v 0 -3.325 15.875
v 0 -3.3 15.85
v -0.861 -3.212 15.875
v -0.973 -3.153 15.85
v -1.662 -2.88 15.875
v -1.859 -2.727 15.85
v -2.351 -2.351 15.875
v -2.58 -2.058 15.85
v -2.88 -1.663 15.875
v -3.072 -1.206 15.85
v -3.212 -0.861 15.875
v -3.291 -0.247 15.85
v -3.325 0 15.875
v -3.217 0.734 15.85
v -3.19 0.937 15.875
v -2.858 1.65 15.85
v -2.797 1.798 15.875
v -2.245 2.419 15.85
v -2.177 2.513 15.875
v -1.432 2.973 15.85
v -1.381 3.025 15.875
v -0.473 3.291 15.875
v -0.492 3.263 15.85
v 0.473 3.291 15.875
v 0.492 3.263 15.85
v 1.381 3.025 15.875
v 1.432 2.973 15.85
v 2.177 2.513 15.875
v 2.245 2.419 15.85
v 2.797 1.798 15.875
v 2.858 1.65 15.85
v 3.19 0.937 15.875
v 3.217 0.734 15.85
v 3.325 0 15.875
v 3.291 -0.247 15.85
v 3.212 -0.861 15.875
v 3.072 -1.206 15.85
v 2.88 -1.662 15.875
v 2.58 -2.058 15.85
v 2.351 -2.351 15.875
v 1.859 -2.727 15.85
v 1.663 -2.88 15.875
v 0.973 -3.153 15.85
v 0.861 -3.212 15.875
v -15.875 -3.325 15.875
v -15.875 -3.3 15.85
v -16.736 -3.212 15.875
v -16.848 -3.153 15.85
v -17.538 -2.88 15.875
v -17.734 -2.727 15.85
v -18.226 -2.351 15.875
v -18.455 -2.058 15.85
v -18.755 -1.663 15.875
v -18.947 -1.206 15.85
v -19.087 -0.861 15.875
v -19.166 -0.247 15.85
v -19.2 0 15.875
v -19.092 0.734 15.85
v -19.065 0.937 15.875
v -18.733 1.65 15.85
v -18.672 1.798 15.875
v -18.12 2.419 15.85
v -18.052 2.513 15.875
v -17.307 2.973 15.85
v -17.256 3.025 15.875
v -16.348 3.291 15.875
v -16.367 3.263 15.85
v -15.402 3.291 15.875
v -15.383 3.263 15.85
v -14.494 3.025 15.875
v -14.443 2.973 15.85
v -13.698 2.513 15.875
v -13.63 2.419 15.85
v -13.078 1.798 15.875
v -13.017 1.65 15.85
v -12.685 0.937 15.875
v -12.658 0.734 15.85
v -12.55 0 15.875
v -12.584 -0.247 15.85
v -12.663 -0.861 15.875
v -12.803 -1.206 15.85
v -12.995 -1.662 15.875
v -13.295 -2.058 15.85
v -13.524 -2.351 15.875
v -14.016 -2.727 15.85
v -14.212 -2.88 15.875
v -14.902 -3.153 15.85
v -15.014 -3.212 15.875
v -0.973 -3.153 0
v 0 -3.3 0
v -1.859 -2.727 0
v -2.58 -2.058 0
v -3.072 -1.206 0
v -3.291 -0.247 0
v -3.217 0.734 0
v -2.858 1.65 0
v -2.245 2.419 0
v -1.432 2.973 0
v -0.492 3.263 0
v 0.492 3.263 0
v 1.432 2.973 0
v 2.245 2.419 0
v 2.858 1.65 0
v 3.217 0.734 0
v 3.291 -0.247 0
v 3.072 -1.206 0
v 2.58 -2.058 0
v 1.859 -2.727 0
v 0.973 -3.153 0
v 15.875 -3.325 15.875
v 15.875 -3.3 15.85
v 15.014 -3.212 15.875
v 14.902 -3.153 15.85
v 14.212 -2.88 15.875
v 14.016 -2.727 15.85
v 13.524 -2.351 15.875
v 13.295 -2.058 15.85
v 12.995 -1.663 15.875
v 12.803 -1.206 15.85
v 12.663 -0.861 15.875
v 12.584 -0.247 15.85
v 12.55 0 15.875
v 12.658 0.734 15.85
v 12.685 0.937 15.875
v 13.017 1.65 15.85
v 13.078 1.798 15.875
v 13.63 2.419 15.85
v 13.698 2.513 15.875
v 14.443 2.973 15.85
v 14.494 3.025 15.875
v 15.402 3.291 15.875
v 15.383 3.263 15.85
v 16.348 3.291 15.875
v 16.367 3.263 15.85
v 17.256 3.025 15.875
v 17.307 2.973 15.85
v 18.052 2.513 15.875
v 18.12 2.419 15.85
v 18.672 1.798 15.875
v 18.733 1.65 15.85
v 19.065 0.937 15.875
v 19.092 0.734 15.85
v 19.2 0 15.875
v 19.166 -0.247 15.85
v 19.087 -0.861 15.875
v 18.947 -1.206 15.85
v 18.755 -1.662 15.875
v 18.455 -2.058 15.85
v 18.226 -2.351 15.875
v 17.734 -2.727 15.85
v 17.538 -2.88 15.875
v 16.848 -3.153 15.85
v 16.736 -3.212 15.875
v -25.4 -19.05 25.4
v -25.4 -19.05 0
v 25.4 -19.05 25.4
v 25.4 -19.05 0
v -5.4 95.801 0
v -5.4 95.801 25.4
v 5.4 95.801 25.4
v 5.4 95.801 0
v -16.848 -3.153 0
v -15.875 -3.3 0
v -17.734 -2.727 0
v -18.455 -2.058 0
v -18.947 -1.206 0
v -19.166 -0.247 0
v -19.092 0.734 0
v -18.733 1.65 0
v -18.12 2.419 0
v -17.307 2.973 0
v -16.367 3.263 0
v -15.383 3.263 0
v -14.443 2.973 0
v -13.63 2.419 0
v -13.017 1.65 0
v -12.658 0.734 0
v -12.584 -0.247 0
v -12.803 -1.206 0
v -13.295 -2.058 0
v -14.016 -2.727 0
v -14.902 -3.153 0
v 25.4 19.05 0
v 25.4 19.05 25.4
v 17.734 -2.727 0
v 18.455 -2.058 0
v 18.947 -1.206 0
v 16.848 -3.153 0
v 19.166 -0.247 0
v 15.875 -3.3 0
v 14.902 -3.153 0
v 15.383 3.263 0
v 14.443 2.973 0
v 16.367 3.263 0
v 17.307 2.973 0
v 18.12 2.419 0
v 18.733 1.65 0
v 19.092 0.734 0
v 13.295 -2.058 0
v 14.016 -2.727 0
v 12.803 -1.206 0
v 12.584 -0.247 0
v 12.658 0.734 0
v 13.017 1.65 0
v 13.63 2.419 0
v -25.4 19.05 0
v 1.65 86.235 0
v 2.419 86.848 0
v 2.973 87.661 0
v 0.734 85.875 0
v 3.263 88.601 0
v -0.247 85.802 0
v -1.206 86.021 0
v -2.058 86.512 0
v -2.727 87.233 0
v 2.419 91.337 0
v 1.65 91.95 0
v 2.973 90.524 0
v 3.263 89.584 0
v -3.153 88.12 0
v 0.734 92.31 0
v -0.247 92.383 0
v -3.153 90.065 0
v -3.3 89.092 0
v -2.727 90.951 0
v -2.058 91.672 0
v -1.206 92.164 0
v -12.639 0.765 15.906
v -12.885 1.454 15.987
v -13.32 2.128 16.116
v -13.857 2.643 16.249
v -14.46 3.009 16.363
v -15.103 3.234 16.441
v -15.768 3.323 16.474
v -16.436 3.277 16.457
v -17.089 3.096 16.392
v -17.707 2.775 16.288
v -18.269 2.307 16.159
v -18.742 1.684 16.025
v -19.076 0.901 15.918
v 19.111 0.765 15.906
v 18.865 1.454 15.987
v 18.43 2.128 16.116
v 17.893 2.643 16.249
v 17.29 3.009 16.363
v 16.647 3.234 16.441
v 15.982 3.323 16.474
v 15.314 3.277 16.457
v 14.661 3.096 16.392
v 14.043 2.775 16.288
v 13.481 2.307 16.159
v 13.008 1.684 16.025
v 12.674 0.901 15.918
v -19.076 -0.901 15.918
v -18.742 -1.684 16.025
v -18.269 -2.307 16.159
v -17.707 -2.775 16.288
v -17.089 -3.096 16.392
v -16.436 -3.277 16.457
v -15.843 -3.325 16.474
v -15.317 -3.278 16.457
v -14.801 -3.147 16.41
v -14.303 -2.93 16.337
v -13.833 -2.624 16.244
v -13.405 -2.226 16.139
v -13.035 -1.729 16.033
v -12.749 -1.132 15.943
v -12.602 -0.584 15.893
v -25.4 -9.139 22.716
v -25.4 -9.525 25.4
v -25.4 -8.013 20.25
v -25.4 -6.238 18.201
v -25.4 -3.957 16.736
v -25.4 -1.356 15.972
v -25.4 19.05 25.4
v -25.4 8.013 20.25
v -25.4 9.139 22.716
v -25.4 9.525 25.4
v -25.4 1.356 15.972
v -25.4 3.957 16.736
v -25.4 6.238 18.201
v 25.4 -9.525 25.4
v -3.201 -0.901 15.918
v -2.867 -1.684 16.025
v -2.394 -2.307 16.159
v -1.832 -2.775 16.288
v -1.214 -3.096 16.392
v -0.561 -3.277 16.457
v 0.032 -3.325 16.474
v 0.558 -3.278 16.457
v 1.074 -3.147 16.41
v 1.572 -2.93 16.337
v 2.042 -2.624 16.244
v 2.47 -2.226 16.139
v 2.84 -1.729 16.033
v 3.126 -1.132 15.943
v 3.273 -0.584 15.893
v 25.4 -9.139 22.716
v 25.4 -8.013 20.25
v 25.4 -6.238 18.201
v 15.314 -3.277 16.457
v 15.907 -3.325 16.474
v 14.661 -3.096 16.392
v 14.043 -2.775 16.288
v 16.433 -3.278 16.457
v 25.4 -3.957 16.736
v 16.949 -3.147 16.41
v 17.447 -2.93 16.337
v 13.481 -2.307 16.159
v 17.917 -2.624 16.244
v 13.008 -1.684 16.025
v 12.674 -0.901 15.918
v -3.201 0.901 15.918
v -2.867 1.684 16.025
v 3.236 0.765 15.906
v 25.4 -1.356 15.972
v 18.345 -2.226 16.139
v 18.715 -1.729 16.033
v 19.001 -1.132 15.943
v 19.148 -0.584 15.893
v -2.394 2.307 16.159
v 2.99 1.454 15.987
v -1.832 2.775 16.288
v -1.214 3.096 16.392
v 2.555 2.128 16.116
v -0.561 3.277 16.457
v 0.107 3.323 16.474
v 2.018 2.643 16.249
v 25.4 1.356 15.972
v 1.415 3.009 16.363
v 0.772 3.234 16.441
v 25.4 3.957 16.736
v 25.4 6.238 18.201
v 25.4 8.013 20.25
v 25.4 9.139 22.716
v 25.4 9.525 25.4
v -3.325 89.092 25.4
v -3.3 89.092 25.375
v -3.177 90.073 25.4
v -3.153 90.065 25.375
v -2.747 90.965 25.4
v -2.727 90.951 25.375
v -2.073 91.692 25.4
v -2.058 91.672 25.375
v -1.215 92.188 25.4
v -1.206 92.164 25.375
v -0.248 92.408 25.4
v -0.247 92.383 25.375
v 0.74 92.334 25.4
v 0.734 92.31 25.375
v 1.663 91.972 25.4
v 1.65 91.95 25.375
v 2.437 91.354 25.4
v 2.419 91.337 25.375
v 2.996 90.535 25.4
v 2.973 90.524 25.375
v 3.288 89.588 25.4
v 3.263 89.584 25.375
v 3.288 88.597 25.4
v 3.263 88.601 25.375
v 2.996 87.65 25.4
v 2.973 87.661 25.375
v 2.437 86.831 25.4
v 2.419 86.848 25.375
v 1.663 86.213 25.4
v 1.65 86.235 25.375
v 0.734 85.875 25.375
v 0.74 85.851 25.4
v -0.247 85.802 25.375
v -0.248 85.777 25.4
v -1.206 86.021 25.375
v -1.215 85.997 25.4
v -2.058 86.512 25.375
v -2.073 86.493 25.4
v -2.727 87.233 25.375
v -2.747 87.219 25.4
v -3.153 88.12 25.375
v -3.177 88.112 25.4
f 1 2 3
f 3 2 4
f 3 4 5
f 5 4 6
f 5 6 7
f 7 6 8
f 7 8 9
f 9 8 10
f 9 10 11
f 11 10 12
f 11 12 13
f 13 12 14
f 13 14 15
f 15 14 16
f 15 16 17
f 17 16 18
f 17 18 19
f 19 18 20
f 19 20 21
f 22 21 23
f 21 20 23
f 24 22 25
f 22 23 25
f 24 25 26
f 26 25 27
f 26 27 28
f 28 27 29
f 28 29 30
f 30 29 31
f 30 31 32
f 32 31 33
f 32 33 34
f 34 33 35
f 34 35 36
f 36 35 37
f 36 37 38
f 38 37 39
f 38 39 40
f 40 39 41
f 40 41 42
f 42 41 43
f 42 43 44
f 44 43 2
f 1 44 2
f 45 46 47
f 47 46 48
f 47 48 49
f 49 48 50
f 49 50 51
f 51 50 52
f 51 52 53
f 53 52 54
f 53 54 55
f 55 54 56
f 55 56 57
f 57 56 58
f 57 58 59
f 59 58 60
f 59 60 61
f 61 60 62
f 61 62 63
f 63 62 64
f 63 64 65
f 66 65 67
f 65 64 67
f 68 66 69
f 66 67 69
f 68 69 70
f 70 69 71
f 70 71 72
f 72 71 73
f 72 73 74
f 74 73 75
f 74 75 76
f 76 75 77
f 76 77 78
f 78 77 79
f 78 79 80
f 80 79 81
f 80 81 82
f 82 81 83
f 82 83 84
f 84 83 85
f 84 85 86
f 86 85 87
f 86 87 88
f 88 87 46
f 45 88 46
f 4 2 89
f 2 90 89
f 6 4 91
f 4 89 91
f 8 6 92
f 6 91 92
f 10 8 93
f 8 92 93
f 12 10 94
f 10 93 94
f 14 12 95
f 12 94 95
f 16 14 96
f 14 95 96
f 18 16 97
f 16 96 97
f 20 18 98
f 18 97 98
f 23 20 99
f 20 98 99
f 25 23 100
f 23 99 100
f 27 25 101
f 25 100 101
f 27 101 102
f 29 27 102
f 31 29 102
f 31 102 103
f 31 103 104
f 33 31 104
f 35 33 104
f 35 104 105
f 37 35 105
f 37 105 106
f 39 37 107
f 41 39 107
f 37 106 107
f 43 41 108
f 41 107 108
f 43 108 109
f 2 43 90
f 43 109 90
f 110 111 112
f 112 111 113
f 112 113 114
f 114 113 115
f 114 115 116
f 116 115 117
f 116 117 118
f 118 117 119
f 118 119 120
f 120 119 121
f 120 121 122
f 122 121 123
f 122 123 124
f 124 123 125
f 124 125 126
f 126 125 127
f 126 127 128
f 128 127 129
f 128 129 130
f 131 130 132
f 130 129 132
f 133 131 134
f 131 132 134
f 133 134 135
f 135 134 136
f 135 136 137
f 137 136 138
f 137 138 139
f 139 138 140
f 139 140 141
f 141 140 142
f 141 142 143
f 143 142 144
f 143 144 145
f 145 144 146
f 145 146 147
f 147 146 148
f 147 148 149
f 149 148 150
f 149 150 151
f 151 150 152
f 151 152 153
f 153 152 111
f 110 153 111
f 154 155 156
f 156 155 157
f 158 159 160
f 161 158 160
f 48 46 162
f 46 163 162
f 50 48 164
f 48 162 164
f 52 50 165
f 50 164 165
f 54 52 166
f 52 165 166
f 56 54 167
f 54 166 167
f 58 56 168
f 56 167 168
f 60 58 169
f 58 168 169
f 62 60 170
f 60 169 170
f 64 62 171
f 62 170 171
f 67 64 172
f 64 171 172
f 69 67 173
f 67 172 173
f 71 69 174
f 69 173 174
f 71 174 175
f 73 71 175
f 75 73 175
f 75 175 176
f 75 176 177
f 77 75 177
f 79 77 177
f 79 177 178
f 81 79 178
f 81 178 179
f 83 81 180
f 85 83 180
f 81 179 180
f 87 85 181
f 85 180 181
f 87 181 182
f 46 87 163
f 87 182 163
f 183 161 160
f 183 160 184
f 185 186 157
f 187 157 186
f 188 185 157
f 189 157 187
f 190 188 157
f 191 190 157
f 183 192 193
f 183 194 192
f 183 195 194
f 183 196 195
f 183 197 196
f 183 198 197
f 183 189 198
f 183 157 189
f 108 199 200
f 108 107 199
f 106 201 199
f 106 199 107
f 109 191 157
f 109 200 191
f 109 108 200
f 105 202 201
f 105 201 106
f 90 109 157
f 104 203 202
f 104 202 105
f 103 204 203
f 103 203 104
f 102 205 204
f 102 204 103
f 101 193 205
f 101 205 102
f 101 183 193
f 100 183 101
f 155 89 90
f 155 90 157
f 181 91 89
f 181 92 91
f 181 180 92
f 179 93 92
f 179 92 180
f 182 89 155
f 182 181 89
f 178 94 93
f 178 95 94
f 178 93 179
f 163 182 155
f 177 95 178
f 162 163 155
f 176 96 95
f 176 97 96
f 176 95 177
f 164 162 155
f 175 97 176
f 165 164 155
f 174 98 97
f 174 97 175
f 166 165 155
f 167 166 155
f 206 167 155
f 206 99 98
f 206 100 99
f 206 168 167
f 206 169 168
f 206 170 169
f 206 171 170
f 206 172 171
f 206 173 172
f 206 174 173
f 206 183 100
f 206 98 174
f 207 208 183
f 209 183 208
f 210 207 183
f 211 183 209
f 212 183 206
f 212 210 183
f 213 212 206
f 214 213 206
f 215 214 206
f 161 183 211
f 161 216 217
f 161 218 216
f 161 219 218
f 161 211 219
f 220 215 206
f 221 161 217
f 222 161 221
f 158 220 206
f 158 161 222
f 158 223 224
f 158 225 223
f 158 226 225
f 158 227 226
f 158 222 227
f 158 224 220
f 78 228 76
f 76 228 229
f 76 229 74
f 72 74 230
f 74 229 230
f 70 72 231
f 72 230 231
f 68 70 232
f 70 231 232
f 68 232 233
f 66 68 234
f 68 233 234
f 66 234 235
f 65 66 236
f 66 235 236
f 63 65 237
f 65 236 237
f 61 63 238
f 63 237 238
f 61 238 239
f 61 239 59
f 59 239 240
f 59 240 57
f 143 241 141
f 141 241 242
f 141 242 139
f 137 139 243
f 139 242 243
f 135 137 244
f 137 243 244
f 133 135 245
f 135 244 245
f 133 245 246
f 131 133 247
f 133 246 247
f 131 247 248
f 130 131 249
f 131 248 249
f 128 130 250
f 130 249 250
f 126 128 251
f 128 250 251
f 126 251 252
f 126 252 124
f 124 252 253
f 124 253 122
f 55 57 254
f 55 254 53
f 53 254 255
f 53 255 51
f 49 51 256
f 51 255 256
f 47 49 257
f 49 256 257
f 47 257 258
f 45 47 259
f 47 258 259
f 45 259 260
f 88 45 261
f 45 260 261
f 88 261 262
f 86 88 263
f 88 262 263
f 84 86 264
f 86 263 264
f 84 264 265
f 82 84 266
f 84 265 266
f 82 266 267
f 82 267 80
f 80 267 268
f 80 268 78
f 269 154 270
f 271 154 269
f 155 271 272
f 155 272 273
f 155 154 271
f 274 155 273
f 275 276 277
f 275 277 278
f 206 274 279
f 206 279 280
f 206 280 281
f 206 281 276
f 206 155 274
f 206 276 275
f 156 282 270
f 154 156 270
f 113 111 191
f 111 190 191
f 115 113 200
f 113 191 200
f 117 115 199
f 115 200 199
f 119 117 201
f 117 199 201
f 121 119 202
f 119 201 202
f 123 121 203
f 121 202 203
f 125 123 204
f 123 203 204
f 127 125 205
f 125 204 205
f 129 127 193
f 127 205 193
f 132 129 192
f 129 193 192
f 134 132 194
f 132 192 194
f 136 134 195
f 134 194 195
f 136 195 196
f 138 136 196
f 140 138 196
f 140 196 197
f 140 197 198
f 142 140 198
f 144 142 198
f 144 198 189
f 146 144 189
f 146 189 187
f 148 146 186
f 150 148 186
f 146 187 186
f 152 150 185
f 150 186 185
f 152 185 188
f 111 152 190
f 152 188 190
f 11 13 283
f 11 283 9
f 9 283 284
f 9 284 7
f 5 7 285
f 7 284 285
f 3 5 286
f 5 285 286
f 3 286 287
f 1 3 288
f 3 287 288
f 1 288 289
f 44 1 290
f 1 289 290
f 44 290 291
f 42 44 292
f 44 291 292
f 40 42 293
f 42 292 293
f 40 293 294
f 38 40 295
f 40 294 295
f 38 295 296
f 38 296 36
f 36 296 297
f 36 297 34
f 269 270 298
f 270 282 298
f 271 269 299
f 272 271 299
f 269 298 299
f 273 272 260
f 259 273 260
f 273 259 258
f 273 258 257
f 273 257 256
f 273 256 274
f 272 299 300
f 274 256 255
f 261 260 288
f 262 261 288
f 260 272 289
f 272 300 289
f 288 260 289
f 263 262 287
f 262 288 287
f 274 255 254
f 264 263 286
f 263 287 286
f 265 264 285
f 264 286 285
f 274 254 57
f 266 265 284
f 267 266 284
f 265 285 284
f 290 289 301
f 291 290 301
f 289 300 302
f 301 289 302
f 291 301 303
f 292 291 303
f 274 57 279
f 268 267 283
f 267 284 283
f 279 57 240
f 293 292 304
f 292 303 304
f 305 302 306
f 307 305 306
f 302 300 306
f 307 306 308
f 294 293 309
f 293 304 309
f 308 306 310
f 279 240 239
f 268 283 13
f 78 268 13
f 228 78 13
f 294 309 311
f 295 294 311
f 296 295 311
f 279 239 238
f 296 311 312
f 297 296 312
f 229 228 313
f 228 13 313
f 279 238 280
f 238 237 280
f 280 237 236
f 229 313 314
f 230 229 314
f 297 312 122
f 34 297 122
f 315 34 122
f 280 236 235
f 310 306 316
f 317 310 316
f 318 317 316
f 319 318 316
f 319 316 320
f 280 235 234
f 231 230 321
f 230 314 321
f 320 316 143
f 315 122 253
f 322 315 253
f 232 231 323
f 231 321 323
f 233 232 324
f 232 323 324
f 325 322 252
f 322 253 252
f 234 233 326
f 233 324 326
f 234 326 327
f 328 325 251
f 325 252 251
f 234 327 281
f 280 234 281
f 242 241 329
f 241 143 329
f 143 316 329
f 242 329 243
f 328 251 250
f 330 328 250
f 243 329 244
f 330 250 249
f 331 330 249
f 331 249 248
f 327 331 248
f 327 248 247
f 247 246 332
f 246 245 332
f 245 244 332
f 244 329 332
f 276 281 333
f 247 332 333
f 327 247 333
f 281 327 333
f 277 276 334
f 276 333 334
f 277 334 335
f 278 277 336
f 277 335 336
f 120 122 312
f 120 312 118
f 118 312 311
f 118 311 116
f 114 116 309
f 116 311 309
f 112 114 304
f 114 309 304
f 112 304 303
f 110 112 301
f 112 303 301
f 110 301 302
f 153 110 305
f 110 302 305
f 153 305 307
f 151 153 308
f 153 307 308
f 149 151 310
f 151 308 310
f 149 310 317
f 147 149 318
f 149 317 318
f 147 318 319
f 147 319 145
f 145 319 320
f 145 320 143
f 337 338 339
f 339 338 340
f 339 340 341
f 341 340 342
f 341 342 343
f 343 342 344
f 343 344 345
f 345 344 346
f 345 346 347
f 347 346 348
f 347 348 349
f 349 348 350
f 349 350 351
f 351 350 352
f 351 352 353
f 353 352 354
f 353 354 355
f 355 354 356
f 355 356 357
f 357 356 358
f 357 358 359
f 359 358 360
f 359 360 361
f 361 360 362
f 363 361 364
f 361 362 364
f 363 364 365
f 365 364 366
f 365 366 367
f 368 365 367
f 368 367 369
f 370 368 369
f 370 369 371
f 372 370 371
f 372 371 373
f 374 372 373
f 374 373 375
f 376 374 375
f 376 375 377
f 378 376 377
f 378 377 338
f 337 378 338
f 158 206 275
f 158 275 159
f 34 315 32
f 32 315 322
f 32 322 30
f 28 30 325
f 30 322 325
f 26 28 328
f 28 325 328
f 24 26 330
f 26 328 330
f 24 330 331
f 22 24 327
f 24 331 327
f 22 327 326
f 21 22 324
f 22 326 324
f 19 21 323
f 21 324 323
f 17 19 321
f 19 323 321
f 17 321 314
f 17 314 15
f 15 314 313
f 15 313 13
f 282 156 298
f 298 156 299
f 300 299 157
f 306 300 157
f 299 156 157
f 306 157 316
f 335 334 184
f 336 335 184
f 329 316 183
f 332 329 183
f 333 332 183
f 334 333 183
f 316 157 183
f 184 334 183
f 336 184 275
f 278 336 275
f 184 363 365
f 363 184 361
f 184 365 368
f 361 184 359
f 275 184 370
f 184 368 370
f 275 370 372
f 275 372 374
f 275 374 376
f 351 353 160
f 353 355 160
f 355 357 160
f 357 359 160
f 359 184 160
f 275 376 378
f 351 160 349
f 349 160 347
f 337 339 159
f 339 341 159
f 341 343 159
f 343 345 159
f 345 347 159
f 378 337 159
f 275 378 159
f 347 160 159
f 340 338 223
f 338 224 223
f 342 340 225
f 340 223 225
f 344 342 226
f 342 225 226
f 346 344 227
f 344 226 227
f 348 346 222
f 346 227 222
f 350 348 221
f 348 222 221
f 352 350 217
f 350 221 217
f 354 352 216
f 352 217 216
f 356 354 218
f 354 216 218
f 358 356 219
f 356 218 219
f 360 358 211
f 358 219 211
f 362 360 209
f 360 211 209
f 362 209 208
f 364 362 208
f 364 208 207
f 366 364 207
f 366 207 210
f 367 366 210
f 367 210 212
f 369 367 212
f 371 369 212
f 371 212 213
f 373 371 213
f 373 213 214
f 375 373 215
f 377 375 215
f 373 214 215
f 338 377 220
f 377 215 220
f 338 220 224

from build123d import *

# Parameters (mm, degrees)
SKETCH1_W                                = 50.8
SKETCH1_H                                = 38.1
BOSS_EXTRUDE1_DEPTH                      = 25.4
CUT_SWEEP1_PROFILE_R                     = 9.525
M6_CLEARANCE_HOLE1_D                     = 6.6
M6_CLEARANCE_HOLE1_CSINK_D               = 6.65
M6_CLEARANCE_HOLE1_CSINK_ANGLE           = 90
M6_CLEARANCE_HOLE1_ON_FACE_2_D           = 6.6
M6_CLEARANCE_HOLE1_ON_FACE_2_CSINK_D     = 6.65
M6_CLEARANCE_HOLE1_ON_FACE_2_CSINK_ANGLE = 90


with BuildPart() as part:
    # Sketch1 → Boss-Extrude1 (new body)
    with BuildSketch(Plane.XY):
        Polygon((5.399653784, 95.801105715), (25.4, 19.05), (-25.4, 19.05), (-5.399653784, 95.801105715), align=None)
        Rectangle(SKETCH1_W, SKETCH1_H)
    extrude(amount=BOSS_EXTRUDE1_DEPTH)

    # Cut-Sweep1: sweep along a path in Sketch2
    with BuildLine(Plane.XY.offset(25.4)) as cut_sweep1_path:
        Line((-25.4, 0), (25.4, 0))
    # Cut-Sweep1 profile (on start of the path) → Cut-Sweep1 (sweep, cut)
    with BuildSketch(Plane(origin=(-25.4, 0, 25.4), x_dir=(0, 1, 0), z_dir=(1, 0, 0))):
        Circle(CUT_SWEEP1_PROFILE_R)
    sweep(path=cut_sweep1_path.line, mode=Mode.SUBTRACT)

    # M6 Clearance Hole1 (through all)
    with Locations(Plane(origin=(0, 0, 15.875), x_dir=(0, 1, 0), z_dir=(0, 0, 1))):
        with Locations((0, 0), (0, 15.875), (0, -15.875)):
            CounterSinkHole(M6_CLEARANCE_HOLE1_D / 2, M6_CLEARANCE_HOLE1_CSINK_D / 2, counter_sink_angle=M6_CLEARANCE_HOLE1_CSINK_ANGLE)

    # M6 Clearance Hole1 on face 2 (through all)
    with Locations(Plane(origin=(0, 89.092444953, 25.4), x_dir=(1, 0, 0), z_dir=(0, 0, 1))):
        with Locations((0, 0)):
            CounterSinkHole(M6_CLEARANCE_HOLE1_ON_FACE_2_D / 2, M6_CLEARANCE_HOLE1_ON_FACE_2_CSINK_D / 2, counter_sink_angle=M6_CLEARANCE_HOLE1_ON_FACE_2_CSINK_ANGLE)


solid = part.part
